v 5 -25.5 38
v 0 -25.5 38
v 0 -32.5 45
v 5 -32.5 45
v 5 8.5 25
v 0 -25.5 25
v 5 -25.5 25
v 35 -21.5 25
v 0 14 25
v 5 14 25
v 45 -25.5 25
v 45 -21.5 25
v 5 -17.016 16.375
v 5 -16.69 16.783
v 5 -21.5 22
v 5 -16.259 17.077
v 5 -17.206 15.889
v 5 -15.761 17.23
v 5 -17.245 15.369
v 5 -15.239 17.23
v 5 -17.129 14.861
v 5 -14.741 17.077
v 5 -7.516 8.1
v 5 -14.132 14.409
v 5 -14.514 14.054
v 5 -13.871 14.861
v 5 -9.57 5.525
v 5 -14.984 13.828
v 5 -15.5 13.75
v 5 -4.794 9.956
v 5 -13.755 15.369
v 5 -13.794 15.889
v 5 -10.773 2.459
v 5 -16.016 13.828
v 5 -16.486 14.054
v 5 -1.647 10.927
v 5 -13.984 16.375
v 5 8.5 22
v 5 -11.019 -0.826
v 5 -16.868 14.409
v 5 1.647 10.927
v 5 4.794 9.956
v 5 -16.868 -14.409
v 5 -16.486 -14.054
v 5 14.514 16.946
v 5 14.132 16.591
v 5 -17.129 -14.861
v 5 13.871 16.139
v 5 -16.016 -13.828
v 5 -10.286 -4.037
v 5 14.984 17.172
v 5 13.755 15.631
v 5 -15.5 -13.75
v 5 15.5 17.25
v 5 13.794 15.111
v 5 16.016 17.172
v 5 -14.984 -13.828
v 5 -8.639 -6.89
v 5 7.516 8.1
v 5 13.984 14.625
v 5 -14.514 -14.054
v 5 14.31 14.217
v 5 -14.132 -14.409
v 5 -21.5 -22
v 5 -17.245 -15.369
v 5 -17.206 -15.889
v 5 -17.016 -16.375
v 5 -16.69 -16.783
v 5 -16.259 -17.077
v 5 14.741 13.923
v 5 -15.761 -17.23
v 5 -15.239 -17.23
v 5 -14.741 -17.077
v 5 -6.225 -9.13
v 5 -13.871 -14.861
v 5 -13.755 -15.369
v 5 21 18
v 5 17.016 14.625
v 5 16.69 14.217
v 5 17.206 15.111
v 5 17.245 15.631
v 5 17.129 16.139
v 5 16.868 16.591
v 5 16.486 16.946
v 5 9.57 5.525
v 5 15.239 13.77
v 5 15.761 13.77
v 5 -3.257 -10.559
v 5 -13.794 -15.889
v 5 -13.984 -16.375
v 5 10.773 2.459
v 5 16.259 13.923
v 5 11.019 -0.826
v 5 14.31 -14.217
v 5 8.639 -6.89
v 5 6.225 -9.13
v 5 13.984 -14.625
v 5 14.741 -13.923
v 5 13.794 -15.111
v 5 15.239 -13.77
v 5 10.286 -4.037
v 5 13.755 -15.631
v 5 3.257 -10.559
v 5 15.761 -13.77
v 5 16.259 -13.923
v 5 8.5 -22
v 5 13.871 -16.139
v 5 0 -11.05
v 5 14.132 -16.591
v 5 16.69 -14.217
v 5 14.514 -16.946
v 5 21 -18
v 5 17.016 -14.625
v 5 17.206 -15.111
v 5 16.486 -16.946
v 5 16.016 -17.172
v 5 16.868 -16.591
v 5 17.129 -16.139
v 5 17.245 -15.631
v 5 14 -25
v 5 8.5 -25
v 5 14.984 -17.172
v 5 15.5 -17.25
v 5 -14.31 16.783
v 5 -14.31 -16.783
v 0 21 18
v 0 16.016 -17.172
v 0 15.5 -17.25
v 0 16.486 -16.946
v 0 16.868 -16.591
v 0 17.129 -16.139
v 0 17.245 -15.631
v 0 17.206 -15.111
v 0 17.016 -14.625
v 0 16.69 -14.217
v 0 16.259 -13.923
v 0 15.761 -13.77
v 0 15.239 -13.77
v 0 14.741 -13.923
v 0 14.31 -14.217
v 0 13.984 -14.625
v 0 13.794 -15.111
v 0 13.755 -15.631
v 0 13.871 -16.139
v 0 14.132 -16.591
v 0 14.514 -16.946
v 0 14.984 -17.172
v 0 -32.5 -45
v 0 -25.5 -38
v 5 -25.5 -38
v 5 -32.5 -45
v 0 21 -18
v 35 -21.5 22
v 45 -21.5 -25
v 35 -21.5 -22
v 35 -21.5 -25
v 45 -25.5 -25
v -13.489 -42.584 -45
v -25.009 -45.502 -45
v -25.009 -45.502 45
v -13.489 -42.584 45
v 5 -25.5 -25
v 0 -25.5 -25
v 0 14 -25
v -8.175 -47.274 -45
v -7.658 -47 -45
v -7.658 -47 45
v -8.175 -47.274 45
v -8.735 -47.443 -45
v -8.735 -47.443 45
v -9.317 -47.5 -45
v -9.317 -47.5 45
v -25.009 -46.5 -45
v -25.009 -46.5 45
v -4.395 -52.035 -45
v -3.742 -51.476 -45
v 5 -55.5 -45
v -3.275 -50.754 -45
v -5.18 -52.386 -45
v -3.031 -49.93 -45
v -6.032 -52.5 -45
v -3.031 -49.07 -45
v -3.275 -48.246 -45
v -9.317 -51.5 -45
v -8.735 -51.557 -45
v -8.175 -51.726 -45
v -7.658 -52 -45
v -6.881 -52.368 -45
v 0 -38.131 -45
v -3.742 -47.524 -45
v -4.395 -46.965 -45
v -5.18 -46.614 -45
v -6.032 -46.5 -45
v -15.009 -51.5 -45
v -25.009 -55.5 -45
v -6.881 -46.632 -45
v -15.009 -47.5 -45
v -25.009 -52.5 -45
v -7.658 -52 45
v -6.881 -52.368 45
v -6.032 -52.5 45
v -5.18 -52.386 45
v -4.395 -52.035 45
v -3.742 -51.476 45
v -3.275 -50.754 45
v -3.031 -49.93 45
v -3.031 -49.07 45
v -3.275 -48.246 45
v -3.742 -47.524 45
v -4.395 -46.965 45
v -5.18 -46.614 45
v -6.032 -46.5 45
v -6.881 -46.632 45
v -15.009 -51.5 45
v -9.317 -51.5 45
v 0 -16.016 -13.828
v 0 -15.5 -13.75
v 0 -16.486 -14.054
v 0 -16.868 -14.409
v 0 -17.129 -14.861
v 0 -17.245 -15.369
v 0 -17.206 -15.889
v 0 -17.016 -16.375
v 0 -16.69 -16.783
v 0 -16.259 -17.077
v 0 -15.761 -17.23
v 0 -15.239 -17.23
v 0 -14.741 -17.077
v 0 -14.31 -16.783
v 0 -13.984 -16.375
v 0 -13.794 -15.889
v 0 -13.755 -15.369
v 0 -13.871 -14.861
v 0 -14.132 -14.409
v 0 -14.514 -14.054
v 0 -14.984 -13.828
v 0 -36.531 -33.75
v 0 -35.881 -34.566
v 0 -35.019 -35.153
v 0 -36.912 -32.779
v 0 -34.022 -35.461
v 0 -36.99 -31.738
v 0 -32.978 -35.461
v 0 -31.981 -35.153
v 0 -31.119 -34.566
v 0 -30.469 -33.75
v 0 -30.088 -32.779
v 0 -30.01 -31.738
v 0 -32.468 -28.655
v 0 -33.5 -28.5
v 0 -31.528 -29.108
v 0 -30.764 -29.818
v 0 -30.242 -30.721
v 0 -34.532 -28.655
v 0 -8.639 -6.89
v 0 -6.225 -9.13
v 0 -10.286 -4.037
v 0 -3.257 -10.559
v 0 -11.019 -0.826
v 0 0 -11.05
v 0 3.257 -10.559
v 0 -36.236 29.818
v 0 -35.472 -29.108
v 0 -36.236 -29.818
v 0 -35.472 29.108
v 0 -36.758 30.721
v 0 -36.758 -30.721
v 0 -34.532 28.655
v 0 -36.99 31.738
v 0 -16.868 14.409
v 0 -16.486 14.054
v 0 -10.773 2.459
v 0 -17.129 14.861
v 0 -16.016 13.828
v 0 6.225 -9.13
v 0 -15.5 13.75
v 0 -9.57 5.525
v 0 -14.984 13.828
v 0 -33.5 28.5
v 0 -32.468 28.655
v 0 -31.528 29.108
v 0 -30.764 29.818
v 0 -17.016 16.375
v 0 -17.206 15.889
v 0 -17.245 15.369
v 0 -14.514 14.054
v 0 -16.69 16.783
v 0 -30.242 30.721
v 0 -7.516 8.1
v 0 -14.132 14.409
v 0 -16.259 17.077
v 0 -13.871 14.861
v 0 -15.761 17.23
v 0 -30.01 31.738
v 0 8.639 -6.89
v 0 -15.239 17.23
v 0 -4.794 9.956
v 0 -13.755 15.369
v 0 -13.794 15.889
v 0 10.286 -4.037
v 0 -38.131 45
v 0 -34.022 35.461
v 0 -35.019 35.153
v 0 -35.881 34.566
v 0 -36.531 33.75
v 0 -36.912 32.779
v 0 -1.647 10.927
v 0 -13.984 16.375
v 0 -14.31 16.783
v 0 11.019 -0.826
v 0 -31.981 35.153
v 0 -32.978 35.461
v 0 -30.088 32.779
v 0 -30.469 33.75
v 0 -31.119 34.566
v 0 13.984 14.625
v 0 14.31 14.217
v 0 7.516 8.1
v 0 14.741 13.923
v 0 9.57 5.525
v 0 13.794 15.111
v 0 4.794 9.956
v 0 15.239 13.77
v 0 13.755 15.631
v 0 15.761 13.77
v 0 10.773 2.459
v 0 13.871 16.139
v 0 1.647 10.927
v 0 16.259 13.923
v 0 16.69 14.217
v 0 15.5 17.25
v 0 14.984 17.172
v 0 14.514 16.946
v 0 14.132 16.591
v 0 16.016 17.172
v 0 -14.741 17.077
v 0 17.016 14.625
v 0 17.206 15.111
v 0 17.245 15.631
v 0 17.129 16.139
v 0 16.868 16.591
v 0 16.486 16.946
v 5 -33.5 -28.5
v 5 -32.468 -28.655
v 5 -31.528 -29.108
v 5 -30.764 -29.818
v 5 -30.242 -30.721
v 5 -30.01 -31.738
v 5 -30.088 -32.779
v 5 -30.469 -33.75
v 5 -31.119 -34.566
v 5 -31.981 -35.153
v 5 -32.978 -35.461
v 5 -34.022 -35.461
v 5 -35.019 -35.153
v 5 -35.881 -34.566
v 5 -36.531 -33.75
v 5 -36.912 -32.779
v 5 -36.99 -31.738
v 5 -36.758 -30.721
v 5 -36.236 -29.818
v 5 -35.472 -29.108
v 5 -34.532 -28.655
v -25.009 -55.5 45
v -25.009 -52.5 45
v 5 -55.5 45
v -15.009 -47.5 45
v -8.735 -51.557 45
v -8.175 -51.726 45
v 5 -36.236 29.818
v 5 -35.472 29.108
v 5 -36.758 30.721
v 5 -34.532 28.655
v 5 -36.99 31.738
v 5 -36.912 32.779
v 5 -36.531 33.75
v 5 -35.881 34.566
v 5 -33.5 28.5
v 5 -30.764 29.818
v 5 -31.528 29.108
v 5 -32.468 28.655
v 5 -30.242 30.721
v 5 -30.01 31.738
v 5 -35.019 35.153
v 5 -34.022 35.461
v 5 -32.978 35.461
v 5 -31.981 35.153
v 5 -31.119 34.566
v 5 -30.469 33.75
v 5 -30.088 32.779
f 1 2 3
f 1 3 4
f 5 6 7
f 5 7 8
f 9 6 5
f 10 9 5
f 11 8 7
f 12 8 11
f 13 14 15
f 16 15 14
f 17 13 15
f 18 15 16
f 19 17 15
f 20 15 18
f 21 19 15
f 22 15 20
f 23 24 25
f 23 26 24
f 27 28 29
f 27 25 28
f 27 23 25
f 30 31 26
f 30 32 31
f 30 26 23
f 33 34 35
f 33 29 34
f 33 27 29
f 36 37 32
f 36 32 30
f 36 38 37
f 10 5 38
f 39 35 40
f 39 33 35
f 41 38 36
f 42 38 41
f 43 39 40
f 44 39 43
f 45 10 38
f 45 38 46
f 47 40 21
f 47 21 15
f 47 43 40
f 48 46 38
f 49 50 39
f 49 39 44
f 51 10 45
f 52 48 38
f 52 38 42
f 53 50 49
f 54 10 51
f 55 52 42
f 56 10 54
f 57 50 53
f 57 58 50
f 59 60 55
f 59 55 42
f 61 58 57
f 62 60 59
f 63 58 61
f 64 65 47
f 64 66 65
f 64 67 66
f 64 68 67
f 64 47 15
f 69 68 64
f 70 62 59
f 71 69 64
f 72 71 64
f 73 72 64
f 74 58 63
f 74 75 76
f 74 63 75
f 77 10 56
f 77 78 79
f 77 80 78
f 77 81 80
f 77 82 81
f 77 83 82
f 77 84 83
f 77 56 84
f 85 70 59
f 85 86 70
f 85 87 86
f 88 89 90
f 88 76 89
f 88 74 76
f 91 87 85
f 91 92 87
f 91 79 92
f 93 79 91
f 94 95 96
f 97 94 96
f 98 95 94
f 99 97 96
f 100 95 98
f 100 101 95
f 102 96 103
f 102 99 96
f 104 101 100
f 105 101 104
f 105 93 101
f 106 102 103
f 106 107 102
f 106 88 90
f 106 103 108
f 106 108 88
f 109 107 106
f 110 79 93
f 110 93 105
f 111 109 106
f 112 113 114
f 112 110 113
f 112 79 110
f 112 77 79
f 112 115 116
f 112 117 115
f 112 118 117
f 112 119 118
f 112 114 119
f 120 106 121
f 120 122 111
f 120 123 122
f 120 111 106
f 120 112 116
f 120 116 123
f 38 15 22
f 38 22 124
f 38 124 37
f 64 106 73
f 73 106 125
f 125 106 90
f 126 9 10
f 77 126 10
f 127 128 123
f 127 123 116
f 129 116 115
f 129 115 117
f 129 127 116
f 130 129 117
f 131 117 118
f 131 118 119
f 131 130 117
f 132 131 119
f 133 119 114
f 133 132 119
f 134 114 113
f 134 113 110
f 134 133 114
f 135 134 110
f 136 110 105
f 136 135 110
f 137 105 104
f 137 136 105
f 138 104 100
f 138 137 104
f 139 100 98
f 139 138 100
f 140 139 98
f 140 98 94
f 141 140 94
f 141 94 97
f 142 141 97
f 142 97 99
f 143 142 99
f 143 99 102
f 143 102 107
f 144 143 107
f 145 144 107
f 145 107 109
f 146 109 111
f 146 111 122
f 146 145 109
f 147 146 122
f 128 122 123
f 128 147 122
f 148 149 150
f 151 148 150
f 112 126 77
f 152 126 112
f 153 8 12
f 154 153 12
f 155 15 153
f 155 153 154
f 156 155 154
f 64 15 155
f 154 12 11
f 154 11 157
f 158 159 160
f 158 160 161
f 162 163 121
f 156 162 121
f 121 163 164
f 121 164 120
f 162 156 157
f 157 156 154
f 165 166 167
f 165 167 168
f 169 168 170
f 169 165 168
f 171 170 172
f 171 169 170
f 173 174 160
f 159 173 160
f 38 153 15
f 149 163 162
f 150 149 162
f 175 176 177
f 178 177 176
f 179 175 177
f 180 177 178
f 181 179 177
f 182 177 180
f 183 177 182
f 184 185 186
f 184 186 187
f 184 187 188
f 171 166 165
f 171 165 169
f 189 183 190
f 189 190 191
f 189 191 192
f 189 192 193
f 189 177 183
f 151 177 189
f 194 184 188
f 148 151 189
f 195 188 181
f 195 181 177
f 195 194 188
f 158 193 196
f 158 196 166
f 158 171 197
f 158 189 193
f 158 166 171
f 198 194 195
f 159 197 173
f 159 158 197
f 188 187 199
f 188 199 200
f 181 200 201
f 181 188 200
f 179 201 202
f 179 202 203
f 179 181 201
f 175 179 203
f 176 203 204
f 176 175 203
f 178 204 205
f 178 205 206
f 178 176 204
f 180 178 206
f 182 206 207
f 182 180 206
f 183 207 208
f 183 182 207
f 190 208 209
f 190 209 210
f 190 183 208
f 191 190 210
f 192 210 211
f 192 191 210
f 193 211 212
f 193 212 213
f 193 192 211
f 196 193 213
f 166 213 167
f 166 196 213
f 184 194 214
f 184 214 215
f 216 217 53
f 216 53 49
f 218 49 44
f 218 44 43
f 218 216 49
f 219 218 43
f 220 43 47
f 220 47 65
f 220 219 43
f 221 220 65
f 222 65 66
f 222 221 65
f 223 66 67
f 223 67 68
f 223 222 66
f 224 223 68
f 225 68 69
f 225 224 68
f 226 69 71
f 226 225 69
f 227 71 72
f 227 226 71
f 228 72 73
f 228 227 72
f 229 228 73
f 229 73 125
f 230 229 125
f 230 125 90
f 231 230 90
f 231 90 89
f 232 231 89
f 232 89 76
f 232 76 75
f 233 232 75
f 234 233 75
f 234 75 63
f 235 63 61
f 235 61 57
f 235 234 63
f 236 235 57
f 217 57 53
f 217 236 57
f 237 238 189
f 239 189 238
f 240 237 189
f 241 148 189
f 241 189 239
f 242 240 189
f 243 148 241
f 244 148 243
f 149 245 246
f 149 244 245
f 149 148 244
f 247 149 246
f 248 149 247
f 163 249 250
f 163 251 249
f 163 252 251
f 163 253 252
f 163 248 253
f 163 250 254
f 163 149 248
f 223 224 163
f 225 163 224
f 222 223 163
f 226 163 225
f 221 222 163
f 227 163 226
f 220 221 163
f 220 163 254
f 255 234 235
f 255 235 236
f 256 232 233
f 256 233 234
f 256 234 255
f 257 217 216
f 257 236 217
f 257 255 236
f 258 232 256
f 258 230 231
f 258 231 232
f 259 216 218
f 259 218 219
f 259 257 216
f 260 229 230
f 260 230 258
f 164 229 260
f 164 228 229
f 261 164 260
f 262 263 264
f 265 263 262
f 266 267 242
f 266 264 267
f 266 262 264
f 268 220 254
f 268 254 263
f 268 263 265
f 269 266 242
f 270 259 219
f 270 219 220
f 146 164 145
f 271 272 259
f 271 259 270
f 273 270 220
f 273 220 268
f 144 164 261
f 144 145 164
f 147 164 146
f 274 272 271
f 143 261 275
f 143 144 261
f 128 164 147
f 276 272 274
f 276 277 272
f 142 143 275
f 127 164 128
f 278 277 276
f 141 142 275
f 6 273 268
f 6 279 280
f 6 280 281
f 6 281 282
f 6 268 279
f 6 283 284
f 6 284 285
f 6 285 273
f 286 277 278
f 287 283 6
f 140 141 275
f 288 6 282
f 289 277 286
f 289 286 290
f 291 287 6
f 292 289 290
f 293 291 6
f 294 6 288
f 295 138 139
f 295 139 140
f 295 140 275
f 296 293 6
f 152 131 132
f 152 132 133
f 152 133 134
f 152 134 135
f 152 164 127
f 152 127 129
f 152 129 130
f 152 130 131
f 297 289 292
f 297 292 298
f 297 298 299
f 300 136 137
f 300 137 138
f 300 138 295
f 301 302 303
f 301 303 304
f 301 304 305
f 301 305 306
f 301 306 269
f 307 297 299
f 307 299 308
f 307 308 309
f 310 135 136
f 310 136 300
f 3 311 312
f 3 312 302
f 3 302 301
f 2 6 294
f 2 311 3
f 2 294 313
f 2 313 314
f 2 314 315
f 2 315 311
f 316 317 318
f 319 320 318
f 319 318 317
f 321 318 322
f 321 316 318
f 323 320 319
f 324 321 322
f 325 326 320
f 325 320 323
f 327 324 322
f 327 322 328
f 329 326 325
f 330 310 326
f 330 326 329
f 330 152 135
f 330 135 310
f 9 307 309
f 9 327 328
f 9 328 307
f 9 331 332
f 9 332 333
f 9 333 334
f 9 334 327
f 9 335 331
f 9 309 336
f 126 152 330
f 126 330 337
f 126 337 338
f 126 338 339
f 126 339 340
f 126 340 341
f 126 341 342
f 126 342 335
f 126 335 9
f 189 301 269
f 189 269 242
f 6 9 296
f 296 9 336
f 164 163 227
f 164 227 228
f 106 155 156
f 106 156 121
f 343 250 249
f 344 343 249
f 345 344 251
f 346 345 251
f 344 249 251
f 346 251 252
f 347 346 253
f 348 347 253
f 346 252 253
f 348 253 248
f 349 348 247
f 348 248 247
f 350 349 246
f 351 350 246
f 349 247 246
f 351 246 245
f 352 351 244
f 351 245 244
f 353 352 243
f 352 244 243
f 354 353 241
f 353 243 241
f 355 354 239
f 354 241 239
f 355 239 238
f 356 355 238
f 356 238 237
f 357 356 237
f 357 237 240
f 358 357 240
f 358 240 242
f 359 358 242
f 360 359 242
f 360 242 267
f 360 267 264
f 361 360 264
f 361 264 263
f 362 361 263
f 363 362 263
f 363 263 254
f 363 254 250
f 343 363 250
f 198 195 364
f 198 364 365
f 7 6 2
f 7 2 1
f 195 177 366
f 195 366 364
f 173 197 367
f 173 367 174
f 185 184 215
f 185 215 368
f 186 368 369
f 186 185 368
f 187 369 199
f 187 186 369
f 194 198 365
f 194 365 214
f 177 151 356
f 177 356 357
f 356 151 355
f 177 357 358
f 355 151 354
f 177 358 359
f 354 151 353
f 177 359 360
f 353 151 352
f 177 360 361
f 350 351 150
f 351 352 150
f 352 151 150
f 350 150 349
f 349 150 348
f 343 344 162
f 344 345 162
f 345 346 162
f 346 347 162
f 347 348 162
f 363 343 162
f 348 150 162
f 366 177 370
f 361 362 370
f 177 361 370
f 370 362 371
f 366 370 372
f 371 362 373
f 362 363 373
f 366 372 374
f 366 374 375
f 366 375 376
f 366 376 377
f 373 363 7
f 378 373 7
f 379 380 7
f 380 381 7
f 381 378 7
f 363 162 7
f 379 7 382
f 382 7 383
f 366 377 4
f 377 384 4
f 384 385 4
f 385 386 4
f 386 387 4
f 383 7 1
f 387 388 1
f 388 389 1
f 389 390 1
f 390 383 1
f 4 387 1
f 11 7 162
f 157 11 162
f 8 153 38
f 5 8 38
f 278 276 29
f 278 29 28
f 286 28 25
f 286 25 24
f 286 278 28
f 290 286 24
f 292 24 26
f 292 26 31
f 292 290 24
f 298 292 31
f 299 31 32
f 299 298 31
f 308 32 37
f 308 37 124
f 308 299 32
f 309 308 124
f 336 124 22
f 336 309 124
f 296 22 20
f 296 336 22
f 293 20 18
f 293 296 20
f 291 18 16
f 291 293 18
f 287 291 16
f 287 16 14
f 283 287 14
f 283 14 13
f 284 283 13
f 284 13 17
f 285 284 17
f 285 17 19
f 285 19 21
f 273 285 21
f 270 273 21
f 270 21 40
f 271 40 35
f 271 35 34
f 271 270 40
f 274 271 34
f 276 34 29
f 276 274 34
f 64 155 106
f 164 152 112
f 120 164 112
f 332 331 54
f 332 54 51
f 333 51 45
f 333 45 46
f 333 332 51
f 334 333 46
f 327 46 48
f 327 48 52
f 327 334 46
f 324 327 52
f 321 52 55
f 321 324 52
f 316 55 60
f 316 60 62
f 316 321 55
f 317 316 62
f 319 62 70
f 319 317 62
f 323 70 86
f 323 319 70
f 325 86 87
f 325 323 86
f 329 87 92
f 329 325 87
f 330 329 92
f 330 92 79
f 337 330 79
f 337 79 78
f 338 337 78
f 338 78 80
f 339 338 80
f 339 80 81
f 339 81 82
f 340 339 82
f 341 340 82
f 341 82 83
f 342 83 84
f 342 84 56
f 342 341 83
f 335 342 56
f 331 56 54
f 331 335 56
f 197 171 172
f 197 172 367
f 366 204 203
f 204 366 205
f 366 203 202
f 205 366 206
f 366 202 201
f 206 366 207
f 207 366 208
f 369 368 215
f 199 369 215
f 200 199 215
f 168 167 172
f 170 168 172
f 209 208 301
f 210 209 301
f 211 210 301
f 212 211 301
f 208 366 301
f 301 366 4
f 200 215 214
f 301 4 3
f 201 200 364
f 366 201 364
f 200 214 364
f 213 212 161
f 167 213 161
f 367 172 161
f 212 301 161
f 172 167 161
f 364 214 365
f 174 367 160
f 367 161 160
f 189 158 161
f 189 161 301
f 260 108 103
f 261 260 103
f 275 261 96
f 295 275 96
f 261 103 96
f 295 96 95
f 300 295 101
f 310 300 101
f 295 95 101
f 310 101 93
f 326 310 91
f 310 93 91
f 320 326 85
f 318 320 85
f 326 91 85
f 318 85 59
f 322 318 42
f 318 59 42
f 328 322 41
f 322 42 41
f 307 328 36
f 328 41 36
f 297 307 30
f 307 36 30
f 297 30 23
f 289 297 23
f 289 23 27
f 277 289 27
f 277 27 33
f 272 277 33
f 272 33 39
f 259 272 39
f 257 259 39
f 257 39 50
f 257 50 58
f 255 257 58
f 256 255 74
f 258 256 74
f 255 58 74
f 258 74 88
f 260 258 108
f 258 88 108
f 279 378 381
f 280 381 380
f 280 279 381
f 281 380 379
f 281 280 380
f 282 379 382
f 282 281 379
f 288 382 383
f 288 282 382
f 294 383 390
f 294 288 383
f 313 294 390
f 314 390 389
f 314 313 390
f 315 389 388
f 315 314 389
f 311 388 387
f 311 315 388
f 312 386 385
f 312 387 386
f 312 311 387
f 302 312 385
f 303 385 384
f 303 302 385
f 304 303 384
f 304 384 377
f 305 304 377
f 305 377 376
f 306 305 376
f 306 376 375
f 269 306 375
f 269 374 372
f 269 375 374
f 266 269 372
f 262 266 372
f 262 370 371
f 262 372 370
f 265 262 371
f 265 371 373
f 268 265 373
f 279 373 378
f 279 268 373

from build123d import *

# Parameters (mm, degrees)
SKETCH1_W           = 50
SKETCH1_H           = 46.5
SKETCH1_R           = 1.75
BOSS_EXTRUDE1_DEPTH = 5
SKETCH2_R           = 11.05
CUT_EXTRUDE1_DEPTH  = 5
SKETCH3_W           = 50
SKETCH3_H           = 4
BOSS_EXTRUDE2_DEPTH = 40
RIB1_REACH          = 73.939
SKETCH4_WALL_W      = 188.304827768
SKETCH4_WALL_H      = 3
SKETCH5_W           = 5
SKETCH5_H           = 50
BOSS_EXTRUDE3_DEPTH = 27
SKETCH8_W           = 5
SKETCH8_H           = 27
BOSS_EXTRUDE5_DEPTH = 20
SKETCH9_W           = 5
SKETCH9_H           = 90
BOSS_EXTRUDE6_DEPTH = 3
BOSS_EXTRUDE7_DEPTH = 90
SKETCH12_R          = 3.5
CUT_EXTRUDE2_DEPTH  = 85.44080767
CHAMFER1_SIZE       = 7
CHAMFER2_SIZE       = 7


with BuildPart() as part:
    # Sketch1 → Boss-Extrude1 (new body)
    with BuildSketch(Plane(origin=(0, 0, 0), x_dir=(0, 0, -1), z_dir=(1, 0, 0))):
        with Locations((0, -2.25)):
            Rectangle(SKETCH1_W, SKETCH1_H)
        with Locations((15.5, 15.5)):
            Circle(SKETCH1_R, mode=Mode.SUBTRACT)
        with Locations(Location((15.5, -15.5, 0), (0, 0, 180))):
            Circle(SKETCH1_R, mode=Mode.SUBTRACT)
        with Locations((-15.5, -15.5)):
            Circle(SKETCH1_R, mode=Mode.SUBTRACT)
        with Locations(Location((-15.5, 15.5, 0), (0, 0, 180))):
            Circle(SKETCH1_R, mode=Mode.SUBTRACT)
    extrude(amount=BOSS_EXTRUDE1_DEPTH)

    # Sketch2 → Cut-Extrude1 (cut)
    with BuildSketch(Plane(origin=(5, 0, 0), x_dir=(0, 0, -1), z_dir=(1, 0, 0))):
        Circle(SKETCH2_R)
    extrude(amount=-CUT_EXTRUDE1_DEPTH, mode=Mode.SUBTRACT)

    # Sketch3 → Boss-Extrude2 (add)
    with BuildSketch(Plane(origin=(5, 0, 0), x_dir=(0, 0, -1), z_dir=(1, 0, 0))):
        with Locations((0, -23.5)):
            Rectangle(SKETCH3_W, SKETCH3_H)
    extrude(amount=BOSS_EXTRUDE2_DEPTH)

    # Sketch4 wall → Rib1 (add, up to next)
    with BuildSketch(Plane(origin=(20, -6.5, -25), x_dir=(-0.707106781187, 0.707106781187, 0), z_dir=(0.707106781187, 0.707106781187, 0)), mode=Mode.PRIVATE) as rib1_sk1:
        with Locations((0, 1.5)):
            Rectangle(SKETCH4_WALL_W, SKETCH4_WALL_H)
    rib1_tool1 = extrude(rib1_sk1.sketch, amount=-RIB1_REACH, mode=Mode.PRIVATE) - part.part
    rib1 = rib1_tool1.solids().sort_by_distance((20, -6.5, -25))[0]
    add(rib1)

    # Mirror1: Rib1 across plane
    add(rib1.mirror(Plane.XY))

    # Sketch5 → Boss-Extrude3 (add)
    with BuildSketch(Plane.XZ.offset(25.5)):
        with Locations((2.5, 0)):
            Rectangle(SKETCH5_W, SKETCH5_H)
    extrude(amount=BOSS_EXTRUDE3_DEPTH)

    # Sketch8 → Boss-Extrude5 (add)
    with BuildSketch(Plane.XY.offset(25)):
        with Locations((2.5, -39)):
            Rectangle(SKETCH8_W, SKETCH8_H)
    boss_extrude5 = extrude(amount=BOSS_EXTRUDE5_DEPTH)

    # Mirror2: Boss-Extrude5 across plane
    add(boss_extrude5.mirror(Plane.XY))

    # Sketch9 → Boss-Extrude6 (add)
    with BuildSketch(Plane.XZ.offset(52.5)):
        with Locations((2.5, 0)):
            Rectangle(SKETCH9_W, SKETCH9_H)
    extrude(amount=BOSS_EXTRUDE6_DEPTH)

    # Sketch10 → Boss-Extrude7 (add)
    with BuildSketch(Plane(origin=(0, 0, -45), x_dir=(-1, 0, 0), z_dir=(0, 0, -1))):
        with BuildLine():
            Line((25.009423753, -46.5), (25.009423753, -45.502387304))
            Line((25.009423753, -45.502387304), (13.489148599, -42.583974938))
            Line((13.489148599, -42.583974938), (0, -38.131335857))
            Line((0, -38.131335857), (0, -45.5))
            Line((0, -45.5), (0, -55.5))
            Line((0, -55.5), (25.009423753, -55.5))
            Line((25.009423753, -55.5), (25.009423753, -52.5))
            Line((25.009423753, -52.5), (15.009423753, -51.5))
            Line((15.009423753, -51.5), (9.31662479, -51.5))
            ThreePointArc((9.31662479, -51.5), (8.450599387, -51.627718677), (7.658312395, -52))
            ThreePointArc((7.658312395, -52), (3, -49.5), (7.658312395, -47))
            ThreePointArc((7.658312395, -47), (8.450599387, -47.372281323), (9.31662479, -47.5))
            Line((9.31662479, -47.5), (15.009423753, -47.5))
            Line((15.009423753, -47.5), (25.009423753, -46.5))
        make_face()
    extrude(amount=-BOSS_EXTRUDE7_DEPTH)

    # Sketch12 → Cut-Extrude2 (cut, through all)
    with BuildSketch(Plane.ZY):
        with Locations((-32, -33.5)):
            Circle(SKETCH12_R)
    cut_extrude2 = extrude(amount=-CUT_EXTRUDE2_DEPTH, mode=Mode.SUBTRACT)

    # Mirror3: Cut-Extrude2 across plane
    add(cut_extrude2.mirror(Plane.XY), mode=Mode.SUBTRACT)

    # Chamfer1
    chamfer1_edges = [part.edges().sort_by_distance(p)[0] for p in [
        (2.5, 21, -25),
    ]]
    chamfer(chamfer1_edges, length=CHAMFER1_SIZE)

    # Chamfer2
    chamfer2_edges = [part.edges().sort_by_distance(p)[0] for p in [
        (2.5, -25.5, 45),
        (2.5, -25.5, -45),
        (2.5, 21, 25),
    ]]
    chamfer(chamfer2_edges, length=CHAMFER2_SIZE)


solid = part.part
